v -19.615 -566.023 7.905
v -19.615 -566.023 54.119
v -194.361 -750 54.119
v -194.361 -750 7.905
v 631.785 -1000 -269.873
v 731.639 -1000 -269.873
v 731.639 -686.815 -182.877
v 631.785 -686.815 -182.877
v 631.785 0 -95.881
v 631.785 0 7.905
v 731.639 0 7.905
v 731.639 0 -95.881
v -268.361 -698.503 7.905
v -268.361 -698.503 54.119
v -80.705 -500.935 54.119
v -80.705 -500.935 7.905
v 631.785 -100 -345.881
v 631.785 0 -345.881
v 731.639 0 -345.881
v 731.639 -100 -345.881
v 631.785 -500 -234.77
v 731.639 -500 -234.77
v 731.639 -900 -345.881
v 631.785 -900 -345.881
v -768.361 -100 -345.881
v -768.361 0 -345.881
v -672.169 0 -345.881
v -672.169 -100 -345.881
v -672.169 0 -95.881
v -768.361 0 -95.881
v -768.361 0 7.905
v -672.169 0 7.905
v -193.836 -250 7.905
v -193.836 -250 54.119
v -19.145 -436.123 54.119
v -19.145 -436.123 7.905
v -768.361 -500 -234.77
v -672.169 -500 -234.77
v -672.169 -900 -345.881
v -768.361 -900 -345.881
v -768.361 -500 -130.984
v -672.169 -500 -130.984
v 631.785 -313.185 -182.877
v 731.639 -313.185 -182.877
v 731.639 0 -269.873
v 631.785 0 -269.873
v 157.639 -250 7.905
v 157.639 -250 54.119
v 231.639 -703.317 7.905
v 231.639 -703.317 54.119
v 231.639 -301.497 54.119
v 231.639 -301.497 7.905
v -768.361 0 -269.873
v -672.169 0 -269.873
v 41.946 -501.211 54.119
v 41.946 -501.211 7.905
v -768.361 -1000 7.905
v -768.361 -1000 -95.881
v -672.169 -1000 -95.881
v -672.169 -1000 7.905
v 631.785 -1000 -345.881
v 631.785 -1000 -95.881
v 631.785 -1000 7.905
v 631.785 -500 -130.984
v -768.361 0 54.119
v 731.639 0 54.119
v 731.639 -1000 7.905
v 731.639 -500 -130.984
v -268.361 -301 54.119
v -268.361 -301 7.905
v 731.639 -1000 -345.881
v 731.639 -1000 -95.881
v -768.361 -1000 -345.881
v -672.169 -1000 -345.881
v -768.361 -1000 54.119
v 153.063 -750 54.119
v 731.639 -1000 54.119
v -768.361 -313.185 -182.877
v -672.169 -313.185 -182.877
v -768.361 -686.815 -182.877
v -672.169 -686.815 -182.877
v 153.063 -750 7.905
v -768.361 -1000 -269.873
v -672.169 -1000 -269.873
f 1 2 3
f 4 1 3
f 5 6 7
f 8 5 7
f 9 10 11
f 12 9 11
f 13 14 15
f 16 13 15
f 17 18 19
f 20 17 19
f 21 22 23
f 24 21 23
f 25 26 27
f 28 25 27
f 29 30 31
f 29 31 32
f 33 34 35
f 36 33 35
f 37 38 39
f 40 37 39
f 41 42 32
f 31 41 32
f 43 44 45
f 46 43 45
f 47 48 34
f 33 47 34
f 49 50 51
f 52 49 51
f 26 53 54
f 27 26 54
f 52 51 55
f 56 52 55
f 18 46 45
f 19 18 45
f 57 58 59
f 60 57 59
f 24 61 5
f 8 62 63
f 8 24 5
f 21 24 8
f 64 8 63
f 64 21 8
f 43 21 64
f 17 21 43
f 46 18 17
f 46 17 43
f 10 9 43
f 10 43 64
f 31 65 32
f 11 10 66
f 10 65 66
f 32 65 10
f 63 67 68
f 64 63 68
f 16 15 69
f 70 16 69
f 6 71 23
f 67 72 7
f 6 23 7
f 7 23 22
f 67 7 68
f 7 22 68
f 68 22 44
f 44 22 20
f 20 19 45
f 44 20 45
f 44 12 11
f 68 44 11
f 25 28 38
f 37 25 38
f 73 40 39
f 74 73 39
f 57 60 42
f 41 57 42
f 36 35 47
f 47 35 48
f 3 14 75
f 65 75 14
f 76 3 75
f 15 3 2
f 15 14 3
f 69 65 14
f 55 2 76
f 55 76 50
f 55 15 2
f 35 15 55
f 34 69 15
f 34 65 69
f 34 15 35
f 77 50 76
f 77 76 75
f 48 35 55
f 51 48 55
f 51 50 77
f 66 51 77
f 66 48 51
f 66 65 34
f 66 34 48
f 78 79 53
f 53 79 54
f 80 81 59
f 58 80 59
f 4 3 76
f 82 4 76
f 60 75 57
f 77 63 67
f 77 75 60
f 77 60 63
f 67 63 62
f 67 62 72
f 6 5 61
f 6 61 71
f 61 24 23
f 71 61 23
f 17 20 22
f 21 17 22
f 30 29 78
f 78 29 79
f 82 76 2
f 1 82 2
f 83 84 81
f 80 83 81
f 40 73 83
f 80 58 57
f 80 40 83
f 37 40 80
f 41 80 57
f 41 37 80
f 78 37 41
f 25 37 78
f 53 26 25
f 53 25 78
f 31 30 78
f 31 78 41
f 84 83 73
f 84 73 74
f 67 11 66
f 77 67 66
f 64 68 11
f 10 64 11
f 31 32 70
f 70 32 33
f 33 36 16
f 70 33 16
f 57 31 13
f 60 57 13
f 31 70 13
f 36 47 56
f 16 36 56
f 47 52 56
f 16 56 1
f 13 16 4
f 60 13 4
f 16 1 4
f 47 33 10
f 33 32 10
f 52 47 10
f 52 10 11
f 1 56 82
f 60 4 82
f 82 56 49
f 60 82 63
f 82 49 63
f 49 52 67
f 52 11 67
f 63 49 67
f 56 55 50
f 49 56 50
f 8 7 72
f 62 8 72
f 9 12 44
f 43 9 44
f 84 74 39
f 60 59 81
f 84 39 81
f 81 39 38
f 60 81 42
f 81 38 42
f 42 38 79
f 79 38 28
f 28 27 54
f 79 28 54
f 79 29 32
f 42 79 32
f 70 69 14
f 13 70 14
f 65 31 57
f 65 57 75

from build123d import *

# Parameters (mm, degrees)
F0_W     = 1500
F0_H     = 400
F1_DEPTH = 1000
F3_DEPTH = 1500.001
F5_W     = 1303.9535284042
F5_H     = 357.2461120359
F6_DEPTH = 1000.001
F8_DEPTH = 400.001


with BuildPart() as f1:
    # F0 (on Front) → F1 (new body)
    with BuildSketch(Plane.XZ):
        with Locations((-18.3606576174, -145.8811463788)):
            Rectangle(F0_W, F0_H)
    extrude(amount=F1_DEPTH)

    # F2 (on face) → F3 (cut, through all)
    with BuildSketch(Plane.YZ.offset(731.6393423826)):
        Polygon((-1000, 7.905196356), (-500, -130.9836925329), (0, 7.905196356), align=None)
        Polygon((-500, -234.7700352677), (-900, -345.8811463788), (-100, -345.8811463788), align=None)
        Polygon((0, -95.8811463788), (-313.1845830773, -182.8768639003), (0, -269.8725814218), align=None)
        Polygon((-1000, -269.8725814218), (-686.8154169227, -182.8768639003), (-1000, -95.8811463788), align=None)
    extrude(amount=-F3_DEPTH, mode=Mode.SUBTRACT)

    # F5 (on face) → F6 (cut, through all)
    with BuildSketch(Plane(origin=(0, 0, 0), x_dir=(-1, 0, 0), z_dir=(0, 1, 0))):
        with Locations((20.1920866966, -170.717859662)):
            Rectangle(F5_W, F5_H)
    extrude(amount=-F6_DEPTH, mode=Mode.SUBTRACT)

    # F7 (on face) → F8 (cut, through all)
    with BuildSketch(Plane.XY.offset(54.1188536212)):
        Polygon((231.6393423826, -703.3171292919), (231.6393423826, -301.4968633652), (41.9458825629, -501.2107406615), align=None)
        Polygon((153.0627522819, -750), (-19.6146414143, -566.0231540339), (-194.3606576174, -750), align=None)
        Polygon((-268.3606576174, -698.5031366348), (-80.7052512791, -500.9349714958), (-268.3606576174, -301), align=None)
        Polygon((-19.144727302, -436.1225581235), (157.6393423826, -250), (-193.8360482454, -250), align=None)
    extrude(amount=-F8_DEPTH, mode=Mode.SUBTRACT)


solid = f1.part
